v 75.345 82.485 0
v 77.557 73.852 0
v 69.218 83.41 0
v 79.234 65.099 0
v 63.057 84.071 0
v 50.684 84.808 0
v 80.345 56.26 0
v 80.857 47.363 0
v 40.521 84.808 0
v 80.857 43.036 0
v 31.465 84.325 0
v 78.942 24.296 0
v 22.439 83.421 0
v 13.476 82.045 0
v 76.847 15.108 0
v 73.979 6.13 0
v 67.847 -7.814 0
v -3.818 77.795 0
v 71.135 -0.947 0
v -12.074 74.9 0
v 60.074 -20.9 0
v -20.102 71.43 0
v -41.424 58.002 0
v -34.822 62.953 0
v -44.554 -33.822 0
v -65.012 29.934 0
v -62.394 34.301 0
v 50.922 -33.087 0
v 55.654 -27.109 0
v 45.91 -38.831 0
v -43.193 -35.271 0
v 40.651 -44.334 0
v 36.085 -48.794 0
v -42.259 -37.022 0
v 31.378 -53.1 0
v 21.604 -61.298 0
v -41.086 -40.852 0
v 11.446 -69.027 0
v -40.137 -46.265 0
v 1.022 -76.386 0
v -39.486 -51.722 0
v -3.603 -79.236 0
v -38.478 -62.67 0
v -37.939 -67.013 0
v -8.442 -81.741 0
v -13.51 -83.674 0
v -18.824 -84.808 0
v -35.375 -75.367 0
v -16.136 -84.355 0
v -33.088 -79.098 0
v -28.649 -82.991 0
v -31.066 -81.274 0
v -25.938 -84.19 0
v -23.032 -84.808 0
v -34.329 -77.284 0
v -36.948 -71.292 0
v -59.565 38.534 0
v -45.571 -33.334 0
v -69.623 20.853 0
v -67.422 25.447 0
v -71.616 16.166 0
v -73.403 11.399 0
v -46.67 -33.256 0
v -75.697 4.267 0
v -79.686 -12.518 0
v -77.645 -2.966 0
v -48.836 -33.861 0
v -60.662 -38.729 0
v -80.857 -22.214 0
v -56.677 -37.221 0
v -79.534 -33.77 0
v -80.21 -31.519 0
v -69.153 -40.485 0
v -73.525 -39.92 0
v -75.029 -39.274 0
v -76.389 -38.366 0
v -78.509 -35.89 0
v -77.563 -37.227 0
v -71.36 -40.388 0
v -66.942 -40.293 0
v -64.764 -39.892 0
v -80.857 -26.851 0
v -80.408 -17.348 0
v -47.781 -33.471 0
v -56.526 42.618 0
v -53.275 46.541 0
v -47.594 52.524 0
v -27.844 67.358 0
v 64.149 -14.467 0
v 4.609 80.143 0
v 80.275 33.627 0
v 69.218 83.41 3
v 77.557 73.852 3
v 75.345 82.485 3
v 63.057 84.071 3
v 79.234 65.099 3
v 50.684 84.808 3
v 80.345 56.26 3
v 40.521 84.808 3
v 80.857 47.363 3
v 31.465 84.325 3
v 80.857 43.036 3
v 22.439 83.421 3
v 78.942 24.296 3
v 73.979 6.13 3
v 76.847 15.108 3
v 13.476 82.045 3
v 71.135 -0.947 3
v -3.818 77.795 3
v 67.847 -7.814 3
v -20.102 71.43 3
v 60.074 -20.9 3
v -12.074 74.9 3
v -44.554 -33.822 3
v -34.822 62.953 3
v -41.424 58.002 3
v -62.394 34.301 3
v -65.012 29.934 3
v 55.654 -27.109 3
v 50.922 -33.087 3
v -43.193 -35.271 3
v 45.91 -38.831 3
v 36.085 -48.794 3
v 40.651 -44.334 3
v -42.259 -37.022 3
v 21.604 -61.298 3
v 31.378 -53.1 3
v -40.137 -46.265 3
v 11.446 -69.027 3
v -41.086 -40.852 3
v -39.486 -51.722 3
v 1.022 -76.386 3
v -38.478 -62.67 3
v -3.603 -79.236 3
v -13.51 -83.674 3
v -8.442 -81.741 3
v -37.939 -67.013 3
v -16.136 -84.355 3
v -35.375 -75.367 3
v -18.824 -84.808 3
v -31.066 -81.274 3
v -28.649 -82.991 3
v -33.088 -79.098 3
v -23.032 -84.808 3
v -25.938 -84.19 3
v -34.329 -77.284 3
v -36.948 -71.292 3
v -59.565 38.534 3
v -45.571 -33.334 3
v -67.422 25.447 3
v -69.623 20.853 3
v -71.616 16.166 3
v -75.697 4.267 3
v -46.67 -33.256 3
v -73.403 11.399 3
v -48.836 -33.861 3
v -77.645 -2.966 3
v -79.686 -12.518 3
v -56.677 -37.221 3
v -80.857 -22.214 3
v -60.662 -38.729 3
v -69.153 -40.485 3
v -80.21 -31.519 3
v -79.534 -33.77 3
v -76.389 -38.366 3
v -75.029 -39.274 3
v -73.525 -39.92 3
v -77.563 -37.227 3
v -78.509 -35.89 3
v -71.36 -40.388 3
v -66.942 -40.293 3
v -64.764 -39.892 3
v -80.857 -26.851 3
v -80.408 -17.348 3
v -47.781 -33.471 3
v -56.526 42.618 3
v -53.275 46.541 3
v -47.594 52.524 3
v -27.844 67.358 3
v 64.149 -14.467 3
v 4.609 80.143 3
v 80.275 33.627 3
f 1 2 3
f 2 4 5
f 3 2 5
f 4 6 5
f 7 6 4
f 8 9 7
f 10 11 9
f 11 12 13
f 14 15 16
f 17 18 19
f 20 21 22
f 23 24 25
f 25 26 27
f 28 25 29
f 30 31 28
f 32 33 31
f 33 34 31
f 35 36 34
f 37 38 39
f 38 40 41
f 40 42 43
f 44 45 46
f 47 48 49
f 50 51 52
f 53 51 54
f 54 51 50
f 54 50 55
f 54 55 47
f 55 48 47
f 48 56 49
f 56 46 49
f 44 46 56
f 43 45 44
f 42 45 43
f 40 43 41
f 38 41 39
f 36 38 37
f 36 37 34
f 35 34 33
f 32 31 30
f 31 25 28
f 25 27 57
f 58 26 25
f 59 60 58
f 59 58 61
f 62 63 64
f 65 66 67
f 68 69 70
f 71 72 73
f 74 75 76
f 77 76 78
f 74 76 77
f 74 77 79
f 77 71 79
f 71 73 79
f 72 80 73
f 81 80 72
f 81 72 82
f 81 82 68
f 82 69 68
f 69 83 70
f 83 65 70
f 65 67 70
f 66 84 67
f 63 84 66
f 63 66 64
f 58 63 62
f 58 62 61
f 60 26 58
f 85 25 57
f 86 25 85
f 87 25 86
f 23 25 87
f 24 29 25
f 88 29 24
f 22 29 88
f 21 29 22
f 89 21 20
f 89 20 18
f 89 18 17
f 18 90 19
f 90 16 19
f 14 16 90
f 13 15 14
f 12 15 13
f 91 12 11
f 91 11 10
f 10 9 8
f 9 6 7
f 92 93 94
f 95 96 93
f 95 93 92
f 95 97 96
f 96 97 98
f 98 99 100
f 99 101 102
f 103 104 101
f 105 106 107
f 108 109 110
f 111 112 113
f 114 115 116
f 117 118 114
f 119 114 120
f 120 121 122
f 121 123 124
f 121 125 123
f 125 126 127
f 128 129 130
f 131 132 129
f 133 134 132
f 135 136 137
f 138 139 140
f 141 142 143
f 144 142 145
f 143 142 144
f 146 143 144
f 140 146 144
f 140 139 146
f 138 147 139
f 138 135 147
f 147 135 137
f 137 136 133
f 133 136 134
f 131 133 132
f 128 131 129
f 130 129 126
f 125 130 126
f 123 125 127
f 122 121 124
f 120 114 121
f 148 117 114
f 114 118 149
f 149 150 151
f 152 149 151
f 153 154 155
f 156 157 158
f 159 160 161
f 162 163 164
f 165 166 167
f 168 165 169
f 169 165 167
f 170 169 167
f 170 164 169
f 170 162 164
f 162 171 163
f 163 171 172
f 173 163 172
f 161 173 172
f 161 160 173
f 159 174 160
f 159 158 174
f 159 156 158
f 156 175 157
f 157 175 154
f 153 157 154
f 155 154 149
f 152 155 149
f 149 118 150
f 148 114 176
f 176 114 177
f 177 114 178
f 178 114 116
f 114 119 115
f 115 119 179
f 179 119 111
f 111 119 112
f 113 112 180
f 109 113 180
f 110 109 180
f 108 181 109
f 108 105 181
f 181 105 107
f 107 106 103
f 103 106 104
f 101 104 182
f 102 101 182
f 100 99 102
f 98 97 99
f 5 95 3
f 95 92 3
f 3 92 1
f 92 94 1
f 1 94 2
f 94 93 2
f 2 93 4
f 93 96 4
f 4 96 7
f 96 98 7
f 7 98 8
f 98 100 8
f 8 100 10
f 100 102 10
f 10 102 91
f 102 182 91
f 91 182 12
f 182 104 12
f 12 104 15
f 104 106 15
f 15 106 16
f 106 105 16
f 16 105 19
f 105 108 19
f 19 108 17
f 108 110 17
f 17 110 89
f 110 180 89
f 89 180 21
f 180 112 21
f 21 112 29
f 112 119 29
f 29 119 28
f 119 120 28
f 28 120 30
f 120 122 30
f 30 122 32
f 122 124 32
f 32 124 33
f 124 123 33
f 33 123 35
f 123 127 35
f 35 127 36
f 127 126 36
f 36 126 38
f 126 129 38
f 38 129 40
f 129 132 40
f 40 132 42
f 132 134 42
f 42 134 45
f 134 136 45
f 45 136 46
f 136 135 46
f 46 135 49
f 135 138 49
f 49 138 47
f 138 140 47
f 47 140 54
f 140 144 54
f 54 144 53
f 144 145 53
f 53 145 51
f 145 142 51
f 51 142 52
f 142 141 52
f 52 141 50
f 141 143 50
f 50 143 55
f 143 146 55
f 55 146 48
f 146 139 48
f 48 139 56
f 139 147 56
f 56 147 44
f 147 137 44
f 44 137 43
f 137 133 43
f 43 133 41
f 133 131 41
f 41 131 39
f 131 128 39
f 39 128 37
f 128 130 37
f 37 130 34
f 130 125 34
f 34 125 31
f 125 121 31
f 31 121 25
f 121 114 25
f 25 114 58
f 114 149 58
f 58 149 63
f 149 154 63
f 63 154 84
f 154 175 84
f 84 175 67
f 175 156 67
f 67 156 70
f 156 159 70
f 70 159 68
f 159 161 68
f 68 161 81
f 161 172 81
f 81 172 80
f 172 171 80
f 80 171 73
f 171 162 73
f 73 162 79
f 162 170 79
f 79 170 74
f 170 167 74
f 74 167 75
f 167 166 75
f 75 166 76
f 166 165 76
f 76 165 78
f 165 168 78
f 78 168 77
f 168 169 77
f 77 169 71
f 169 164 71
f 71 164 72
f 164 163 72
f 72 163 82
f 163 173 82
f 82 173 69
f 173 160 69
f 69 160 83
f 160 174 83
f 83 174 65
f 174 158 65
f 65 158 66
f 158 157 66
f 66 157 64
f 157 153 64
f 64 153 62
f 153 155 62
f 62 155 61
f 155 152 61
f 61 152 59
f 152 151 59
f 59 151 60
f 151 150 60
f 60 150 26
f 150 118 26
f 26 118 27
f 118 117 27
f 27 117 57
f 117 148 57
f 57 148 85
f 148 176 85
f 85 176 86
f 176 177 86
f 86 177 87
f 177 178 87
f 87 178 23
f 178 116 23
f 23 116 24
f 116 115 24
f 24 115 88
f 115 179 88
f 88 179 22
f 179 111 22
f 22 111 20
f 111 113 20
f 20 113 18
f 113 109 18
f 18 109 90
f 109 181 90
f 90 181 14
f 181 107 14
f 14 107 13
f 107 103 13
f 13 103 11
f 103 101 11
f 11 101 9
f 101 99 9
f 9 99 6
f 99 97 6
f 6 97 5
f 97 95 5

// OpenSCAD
// Module names are of the form poly_<inkscape-path-id>().  As a result,
// you can associate a polygon in this OpenSCAD program with the corresponding
// SVG element in the Inkscape document by looking for the XML element with
// the attribute id="inkscape-path-id".

// fudge value is used to ensure that subtracted solids are a tad taller
// in the z dimension than the polygon being subtracted from.  This helps
// keep the resulting .stl file manifold.
fudge = 0.1;

module poly_path4(h)
{
  scale([25.4/90, -25.4/90, 1]) union()
  {
    linear_extrude(height=h)
      polygon([[143.580000,-300.500000],[179.590000,-300.500000],[223.430000,-297.888750],[245.259063,-295.548594],[266.970000,-292.270000],[274.807031,-261.678750],[280.751250,-230.667500],[284.687344,-199.345000],[286.500000,-167.820000],[286.500000,-152.490000],[284.438750,-119.152031],[279.715000,-86.088750],[272.291250,-53.533594],[262.130000,-21.720000],[252.051504,3.355098],[240.403281,27.688281],[227.301230,51.261387],[212.861250,74.056250],[197.199238,96.054707],[180.431094,117.238594],[162.672715,137.589746],[144.040000,157.090000],[127.859473,172.893242],[111.182656,188.149688],[76.548750,217.197500],[40.555469,244.584063],[3.620000,270.660000],[-12.767500,280.757656],[-29.912500,289.633750],[-47.871250,296.482969],[-57.173359,298.895840],[-66.700000,300.500000],[-81.610000,300.500000],[-91.906406,298.310781],[-101.513750,294.063750],[-110.076719,287.977344],[-117.240000,280.270000],[-121.637676,273.841543],[-125.344531,267.047344],[-130.918750,252.608750],[-134.428594,237.448281],[-136.340000,222.060000],[-139.910000,183.266250],[-142.218125,163.932656],[-145.580000,144.750000],[-149.737500,131.181250],[-153.047188,124.976719],[-157.870000,119.840000],[-161.472188,118.111094],[-165.365000,117.836250],[-169.302813,118.598281],[-173.040000,119.980000],[-200.825000,131.883750],[-214.943438,137.227656],[-229.480000,141.350000],[-237.195938,142.770469],[-245.030000,143.451250],[-252.849063,143.106406],[-260.520000,141.450000],[-265.850000,139.161094],[-270.670000,135.941250],[-274.830000,131.905781],[-278.180000,127.170000],[-281.814375,119.656563],[-284.207500,111.680000],[-286.500000,95.140000],[-286.500000,78.710000],[-284.908906,61.469687],[-282.351250,44.355000],[-275.120000,10.510000],[-268.216250,-15.120000],[-260.090000,-40.390000],[-253.758574,-57.279395],[-246.694844,-73.887656],[-238.895879,-90.166152],[-230.358750,-106.066250],[-221.080527,-121.539316],[-211.058281,-136.536719],[-200.289082,-151.009824],[-188.770000,-164.910000],[-168.639219,-186.110000],[-146.778750,-205.517500],[-123.386406,-223.061250],[-98.660000,-238.670000],[-71.227344,-253.097188],[-42.781250,-265.392500],[-13.527031,-275.651563],[16.330000,-283.970000],[47.751094,-290.709687],[79.508750,-295.587500],[111.489531,-298.789062],[143.580000,-300.500000]]);
  }
}

poly_path4(3);
